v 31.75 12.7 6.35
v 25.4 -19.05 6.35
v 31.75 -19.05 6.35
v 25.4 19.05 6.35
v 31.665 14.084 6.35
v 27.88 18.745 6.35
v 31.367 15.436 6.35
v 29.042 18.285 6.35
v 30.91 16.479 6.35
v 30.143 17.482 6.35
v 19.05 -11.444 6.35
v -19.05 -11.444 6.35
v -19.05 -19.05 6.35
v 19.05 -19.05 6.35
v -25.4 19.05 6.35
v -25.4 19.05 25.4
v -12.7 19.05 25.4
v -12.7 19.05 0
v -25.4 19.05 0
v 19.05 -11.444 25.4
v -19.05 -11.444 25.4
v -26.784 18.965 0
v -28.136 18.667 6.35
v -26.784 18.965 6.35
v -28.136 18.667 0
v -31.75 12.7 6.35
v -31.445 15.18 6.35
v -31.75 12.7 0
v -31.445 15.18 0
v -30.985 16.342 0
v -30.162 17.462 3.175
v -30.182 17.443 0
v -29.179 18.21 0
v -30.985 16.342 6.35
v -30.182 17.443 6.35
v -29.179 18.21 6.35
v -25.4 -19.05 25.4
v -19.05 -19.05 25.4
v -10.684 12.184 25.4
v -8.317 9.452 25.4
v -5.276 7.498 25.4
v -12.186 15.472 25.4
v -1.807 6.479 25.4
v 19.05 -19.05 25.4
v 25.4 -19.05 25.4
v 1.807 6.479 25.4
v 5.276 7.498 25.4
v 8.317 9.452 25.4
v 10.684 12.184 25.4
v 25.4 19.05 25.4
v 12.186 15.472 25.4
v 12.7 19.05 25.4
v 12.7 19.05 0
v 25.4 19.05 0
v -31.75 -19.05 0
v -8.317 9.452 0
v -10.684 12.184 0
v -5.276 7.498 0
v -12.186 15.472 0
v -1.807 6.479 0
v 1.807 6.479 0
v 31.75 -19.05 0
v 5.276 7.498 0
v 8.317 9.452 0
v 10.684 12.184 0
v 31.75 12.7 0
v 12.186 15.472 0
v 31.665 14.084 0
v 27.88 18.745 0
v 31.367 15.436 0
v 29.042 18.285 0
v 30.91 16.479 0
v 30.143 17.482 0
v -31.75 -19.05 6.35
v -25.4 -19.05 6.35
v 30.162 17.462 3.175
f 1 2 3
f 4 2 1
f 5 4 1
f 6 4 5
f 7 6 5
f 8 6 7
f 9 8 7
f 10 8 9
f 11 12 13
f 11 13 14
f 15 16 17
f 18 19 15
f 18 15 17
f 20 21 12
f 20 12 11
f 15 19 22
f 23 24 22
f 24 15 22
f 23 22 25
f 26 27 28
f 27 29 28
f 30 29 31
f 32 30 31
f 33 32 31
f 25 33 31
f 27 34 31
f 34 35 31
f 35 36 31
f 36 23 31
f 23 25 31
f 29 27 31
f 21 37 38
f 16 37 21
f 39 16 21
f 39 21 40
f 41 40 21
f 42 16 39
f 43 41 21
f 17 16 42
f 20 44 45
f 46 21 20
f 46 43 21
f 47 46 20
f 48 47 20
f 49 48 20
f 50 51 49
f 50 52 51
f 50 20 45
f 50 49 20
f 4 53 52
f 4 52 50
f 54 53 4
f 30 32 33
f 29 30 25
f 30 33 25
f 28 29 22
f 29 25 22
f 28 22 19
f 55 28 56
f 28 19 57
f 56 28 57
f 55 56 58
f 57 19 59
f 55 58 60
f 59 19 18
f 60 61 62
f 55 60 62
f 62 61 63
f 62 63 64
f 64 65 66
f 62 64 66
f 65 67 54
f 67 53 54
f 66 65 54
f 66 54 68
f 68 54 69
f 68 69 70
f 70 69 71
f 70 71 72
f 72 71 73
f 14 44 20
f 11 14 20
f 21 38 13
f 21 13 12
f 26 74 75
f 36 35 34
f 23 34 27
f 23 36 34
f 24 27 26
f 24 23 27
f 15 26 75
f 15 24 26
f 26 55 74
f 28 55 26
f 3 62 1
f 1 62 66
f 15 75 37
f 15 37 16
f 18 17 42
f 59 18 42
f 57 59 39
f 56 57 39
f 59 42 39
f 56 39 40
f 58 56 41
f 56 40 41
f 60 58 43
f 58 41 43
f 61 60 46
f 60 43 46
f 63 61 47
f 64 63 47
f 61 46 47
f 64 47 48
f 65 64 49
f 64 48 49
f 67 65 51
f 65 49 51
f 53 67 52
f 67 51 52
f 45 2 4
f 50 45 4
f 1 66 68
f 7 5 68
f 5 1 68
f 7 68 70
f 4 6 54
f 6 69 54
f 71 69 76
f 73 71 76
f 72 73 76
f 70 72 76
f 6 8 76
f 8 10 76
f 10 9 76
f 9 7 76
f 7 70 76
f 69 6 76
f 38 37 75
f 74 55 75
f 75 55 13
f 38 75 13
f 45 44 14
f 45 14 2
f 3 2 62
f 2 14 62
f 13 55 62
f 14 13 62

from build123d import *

# Parameters (mm, degrees)
F0_W        = 63.5
F0_H        = 38.1
F1_DEPTH    = 6.35
F2_T1_DEPTH = 38.1
F3_W        = 50.8
F3_H        = 38.1
F4_DEPTH    = 19.05
F5_W        = 38.1
F5_H        = 7.6055689663
F6_DEPTH    = 19.05
F7_R        = 12.7
F8_DEPTH    = 25.4


# Not quite as in the source:
# - a fillet or chamfer that OpenCascade refuses, or shapes differently, is made with other operations: its cross-section is extruded or revolved along the edge and cut away or added


with BuildPart() as f1:
    # F0 (on Top) → F1 (new body)
    with BuildSketch(Plane.XY):
        Rectangle(F0_W, F0_H)
    extrude(amount=F1_DEPTH)

    # F2: fillet of radius 6.35 on 2 edges, made by hand

    # F2_s2 → F2_t1 (cut)
    with BuildSketch(Plane.XY.offset(-15.875)):
        with BuildLine():
            add(Edge.make_bspline(
                [(-25.4, 19.05), (-31.75, 19.05), (-31.75, 12.7)],
                knots=[0, 0, 0, 1, 1, 1], degree=2, weights=[1, 1, 1]))
            Line((-31.75, 12.7), (-31.75, 19.05))
            Line((-31.75, 19.05), (-25.4, 19.05))
        make_face()
        with BuildLine():
            add(Edge.make_bspline(
                [(31.75, 12.7), (31.75, 19.05), (25.4, 19.05)],
                knots=[0, 0, 0, 1, 1, 1], degree=2, weights=[1, 1, 1]))
            Line((25.4, 19.05), (31.75, 19.05))
            Line((31.75, 19.05), (31.75, 12.7))
        make_face()
    extrude(amount=F2_T1_DEPTH, mode=Mode.SUBTRACT)

    # F3 (on face) → F4 (join)
    with BuildSketch(Plane.XY.offset(6.35)):
        Rectangle(F3_W, F3_H)
    extrude(amount=F4_DEPTH)

    # F5 (on face) → F6 (cut)
    with BuildSketch(Plane.XY.offset(25.4)):
        with Locations((0, -15.2472155169)):
            Rectangle(F5_W, F5_H)
    extrude(amount=-F6_DEPTH, mode=Mode.SUBTRACT)

    # F7 (on face) → F8 (cut)
    with BuildSketch(Plane.XY.offset(25.4)):
        with Locations((0, 19.05)):
            Circle(F7_R)
    extrude(amount=-F8_DEPTH, mode=Mode.SUBTRACT)


solid = f1.part
